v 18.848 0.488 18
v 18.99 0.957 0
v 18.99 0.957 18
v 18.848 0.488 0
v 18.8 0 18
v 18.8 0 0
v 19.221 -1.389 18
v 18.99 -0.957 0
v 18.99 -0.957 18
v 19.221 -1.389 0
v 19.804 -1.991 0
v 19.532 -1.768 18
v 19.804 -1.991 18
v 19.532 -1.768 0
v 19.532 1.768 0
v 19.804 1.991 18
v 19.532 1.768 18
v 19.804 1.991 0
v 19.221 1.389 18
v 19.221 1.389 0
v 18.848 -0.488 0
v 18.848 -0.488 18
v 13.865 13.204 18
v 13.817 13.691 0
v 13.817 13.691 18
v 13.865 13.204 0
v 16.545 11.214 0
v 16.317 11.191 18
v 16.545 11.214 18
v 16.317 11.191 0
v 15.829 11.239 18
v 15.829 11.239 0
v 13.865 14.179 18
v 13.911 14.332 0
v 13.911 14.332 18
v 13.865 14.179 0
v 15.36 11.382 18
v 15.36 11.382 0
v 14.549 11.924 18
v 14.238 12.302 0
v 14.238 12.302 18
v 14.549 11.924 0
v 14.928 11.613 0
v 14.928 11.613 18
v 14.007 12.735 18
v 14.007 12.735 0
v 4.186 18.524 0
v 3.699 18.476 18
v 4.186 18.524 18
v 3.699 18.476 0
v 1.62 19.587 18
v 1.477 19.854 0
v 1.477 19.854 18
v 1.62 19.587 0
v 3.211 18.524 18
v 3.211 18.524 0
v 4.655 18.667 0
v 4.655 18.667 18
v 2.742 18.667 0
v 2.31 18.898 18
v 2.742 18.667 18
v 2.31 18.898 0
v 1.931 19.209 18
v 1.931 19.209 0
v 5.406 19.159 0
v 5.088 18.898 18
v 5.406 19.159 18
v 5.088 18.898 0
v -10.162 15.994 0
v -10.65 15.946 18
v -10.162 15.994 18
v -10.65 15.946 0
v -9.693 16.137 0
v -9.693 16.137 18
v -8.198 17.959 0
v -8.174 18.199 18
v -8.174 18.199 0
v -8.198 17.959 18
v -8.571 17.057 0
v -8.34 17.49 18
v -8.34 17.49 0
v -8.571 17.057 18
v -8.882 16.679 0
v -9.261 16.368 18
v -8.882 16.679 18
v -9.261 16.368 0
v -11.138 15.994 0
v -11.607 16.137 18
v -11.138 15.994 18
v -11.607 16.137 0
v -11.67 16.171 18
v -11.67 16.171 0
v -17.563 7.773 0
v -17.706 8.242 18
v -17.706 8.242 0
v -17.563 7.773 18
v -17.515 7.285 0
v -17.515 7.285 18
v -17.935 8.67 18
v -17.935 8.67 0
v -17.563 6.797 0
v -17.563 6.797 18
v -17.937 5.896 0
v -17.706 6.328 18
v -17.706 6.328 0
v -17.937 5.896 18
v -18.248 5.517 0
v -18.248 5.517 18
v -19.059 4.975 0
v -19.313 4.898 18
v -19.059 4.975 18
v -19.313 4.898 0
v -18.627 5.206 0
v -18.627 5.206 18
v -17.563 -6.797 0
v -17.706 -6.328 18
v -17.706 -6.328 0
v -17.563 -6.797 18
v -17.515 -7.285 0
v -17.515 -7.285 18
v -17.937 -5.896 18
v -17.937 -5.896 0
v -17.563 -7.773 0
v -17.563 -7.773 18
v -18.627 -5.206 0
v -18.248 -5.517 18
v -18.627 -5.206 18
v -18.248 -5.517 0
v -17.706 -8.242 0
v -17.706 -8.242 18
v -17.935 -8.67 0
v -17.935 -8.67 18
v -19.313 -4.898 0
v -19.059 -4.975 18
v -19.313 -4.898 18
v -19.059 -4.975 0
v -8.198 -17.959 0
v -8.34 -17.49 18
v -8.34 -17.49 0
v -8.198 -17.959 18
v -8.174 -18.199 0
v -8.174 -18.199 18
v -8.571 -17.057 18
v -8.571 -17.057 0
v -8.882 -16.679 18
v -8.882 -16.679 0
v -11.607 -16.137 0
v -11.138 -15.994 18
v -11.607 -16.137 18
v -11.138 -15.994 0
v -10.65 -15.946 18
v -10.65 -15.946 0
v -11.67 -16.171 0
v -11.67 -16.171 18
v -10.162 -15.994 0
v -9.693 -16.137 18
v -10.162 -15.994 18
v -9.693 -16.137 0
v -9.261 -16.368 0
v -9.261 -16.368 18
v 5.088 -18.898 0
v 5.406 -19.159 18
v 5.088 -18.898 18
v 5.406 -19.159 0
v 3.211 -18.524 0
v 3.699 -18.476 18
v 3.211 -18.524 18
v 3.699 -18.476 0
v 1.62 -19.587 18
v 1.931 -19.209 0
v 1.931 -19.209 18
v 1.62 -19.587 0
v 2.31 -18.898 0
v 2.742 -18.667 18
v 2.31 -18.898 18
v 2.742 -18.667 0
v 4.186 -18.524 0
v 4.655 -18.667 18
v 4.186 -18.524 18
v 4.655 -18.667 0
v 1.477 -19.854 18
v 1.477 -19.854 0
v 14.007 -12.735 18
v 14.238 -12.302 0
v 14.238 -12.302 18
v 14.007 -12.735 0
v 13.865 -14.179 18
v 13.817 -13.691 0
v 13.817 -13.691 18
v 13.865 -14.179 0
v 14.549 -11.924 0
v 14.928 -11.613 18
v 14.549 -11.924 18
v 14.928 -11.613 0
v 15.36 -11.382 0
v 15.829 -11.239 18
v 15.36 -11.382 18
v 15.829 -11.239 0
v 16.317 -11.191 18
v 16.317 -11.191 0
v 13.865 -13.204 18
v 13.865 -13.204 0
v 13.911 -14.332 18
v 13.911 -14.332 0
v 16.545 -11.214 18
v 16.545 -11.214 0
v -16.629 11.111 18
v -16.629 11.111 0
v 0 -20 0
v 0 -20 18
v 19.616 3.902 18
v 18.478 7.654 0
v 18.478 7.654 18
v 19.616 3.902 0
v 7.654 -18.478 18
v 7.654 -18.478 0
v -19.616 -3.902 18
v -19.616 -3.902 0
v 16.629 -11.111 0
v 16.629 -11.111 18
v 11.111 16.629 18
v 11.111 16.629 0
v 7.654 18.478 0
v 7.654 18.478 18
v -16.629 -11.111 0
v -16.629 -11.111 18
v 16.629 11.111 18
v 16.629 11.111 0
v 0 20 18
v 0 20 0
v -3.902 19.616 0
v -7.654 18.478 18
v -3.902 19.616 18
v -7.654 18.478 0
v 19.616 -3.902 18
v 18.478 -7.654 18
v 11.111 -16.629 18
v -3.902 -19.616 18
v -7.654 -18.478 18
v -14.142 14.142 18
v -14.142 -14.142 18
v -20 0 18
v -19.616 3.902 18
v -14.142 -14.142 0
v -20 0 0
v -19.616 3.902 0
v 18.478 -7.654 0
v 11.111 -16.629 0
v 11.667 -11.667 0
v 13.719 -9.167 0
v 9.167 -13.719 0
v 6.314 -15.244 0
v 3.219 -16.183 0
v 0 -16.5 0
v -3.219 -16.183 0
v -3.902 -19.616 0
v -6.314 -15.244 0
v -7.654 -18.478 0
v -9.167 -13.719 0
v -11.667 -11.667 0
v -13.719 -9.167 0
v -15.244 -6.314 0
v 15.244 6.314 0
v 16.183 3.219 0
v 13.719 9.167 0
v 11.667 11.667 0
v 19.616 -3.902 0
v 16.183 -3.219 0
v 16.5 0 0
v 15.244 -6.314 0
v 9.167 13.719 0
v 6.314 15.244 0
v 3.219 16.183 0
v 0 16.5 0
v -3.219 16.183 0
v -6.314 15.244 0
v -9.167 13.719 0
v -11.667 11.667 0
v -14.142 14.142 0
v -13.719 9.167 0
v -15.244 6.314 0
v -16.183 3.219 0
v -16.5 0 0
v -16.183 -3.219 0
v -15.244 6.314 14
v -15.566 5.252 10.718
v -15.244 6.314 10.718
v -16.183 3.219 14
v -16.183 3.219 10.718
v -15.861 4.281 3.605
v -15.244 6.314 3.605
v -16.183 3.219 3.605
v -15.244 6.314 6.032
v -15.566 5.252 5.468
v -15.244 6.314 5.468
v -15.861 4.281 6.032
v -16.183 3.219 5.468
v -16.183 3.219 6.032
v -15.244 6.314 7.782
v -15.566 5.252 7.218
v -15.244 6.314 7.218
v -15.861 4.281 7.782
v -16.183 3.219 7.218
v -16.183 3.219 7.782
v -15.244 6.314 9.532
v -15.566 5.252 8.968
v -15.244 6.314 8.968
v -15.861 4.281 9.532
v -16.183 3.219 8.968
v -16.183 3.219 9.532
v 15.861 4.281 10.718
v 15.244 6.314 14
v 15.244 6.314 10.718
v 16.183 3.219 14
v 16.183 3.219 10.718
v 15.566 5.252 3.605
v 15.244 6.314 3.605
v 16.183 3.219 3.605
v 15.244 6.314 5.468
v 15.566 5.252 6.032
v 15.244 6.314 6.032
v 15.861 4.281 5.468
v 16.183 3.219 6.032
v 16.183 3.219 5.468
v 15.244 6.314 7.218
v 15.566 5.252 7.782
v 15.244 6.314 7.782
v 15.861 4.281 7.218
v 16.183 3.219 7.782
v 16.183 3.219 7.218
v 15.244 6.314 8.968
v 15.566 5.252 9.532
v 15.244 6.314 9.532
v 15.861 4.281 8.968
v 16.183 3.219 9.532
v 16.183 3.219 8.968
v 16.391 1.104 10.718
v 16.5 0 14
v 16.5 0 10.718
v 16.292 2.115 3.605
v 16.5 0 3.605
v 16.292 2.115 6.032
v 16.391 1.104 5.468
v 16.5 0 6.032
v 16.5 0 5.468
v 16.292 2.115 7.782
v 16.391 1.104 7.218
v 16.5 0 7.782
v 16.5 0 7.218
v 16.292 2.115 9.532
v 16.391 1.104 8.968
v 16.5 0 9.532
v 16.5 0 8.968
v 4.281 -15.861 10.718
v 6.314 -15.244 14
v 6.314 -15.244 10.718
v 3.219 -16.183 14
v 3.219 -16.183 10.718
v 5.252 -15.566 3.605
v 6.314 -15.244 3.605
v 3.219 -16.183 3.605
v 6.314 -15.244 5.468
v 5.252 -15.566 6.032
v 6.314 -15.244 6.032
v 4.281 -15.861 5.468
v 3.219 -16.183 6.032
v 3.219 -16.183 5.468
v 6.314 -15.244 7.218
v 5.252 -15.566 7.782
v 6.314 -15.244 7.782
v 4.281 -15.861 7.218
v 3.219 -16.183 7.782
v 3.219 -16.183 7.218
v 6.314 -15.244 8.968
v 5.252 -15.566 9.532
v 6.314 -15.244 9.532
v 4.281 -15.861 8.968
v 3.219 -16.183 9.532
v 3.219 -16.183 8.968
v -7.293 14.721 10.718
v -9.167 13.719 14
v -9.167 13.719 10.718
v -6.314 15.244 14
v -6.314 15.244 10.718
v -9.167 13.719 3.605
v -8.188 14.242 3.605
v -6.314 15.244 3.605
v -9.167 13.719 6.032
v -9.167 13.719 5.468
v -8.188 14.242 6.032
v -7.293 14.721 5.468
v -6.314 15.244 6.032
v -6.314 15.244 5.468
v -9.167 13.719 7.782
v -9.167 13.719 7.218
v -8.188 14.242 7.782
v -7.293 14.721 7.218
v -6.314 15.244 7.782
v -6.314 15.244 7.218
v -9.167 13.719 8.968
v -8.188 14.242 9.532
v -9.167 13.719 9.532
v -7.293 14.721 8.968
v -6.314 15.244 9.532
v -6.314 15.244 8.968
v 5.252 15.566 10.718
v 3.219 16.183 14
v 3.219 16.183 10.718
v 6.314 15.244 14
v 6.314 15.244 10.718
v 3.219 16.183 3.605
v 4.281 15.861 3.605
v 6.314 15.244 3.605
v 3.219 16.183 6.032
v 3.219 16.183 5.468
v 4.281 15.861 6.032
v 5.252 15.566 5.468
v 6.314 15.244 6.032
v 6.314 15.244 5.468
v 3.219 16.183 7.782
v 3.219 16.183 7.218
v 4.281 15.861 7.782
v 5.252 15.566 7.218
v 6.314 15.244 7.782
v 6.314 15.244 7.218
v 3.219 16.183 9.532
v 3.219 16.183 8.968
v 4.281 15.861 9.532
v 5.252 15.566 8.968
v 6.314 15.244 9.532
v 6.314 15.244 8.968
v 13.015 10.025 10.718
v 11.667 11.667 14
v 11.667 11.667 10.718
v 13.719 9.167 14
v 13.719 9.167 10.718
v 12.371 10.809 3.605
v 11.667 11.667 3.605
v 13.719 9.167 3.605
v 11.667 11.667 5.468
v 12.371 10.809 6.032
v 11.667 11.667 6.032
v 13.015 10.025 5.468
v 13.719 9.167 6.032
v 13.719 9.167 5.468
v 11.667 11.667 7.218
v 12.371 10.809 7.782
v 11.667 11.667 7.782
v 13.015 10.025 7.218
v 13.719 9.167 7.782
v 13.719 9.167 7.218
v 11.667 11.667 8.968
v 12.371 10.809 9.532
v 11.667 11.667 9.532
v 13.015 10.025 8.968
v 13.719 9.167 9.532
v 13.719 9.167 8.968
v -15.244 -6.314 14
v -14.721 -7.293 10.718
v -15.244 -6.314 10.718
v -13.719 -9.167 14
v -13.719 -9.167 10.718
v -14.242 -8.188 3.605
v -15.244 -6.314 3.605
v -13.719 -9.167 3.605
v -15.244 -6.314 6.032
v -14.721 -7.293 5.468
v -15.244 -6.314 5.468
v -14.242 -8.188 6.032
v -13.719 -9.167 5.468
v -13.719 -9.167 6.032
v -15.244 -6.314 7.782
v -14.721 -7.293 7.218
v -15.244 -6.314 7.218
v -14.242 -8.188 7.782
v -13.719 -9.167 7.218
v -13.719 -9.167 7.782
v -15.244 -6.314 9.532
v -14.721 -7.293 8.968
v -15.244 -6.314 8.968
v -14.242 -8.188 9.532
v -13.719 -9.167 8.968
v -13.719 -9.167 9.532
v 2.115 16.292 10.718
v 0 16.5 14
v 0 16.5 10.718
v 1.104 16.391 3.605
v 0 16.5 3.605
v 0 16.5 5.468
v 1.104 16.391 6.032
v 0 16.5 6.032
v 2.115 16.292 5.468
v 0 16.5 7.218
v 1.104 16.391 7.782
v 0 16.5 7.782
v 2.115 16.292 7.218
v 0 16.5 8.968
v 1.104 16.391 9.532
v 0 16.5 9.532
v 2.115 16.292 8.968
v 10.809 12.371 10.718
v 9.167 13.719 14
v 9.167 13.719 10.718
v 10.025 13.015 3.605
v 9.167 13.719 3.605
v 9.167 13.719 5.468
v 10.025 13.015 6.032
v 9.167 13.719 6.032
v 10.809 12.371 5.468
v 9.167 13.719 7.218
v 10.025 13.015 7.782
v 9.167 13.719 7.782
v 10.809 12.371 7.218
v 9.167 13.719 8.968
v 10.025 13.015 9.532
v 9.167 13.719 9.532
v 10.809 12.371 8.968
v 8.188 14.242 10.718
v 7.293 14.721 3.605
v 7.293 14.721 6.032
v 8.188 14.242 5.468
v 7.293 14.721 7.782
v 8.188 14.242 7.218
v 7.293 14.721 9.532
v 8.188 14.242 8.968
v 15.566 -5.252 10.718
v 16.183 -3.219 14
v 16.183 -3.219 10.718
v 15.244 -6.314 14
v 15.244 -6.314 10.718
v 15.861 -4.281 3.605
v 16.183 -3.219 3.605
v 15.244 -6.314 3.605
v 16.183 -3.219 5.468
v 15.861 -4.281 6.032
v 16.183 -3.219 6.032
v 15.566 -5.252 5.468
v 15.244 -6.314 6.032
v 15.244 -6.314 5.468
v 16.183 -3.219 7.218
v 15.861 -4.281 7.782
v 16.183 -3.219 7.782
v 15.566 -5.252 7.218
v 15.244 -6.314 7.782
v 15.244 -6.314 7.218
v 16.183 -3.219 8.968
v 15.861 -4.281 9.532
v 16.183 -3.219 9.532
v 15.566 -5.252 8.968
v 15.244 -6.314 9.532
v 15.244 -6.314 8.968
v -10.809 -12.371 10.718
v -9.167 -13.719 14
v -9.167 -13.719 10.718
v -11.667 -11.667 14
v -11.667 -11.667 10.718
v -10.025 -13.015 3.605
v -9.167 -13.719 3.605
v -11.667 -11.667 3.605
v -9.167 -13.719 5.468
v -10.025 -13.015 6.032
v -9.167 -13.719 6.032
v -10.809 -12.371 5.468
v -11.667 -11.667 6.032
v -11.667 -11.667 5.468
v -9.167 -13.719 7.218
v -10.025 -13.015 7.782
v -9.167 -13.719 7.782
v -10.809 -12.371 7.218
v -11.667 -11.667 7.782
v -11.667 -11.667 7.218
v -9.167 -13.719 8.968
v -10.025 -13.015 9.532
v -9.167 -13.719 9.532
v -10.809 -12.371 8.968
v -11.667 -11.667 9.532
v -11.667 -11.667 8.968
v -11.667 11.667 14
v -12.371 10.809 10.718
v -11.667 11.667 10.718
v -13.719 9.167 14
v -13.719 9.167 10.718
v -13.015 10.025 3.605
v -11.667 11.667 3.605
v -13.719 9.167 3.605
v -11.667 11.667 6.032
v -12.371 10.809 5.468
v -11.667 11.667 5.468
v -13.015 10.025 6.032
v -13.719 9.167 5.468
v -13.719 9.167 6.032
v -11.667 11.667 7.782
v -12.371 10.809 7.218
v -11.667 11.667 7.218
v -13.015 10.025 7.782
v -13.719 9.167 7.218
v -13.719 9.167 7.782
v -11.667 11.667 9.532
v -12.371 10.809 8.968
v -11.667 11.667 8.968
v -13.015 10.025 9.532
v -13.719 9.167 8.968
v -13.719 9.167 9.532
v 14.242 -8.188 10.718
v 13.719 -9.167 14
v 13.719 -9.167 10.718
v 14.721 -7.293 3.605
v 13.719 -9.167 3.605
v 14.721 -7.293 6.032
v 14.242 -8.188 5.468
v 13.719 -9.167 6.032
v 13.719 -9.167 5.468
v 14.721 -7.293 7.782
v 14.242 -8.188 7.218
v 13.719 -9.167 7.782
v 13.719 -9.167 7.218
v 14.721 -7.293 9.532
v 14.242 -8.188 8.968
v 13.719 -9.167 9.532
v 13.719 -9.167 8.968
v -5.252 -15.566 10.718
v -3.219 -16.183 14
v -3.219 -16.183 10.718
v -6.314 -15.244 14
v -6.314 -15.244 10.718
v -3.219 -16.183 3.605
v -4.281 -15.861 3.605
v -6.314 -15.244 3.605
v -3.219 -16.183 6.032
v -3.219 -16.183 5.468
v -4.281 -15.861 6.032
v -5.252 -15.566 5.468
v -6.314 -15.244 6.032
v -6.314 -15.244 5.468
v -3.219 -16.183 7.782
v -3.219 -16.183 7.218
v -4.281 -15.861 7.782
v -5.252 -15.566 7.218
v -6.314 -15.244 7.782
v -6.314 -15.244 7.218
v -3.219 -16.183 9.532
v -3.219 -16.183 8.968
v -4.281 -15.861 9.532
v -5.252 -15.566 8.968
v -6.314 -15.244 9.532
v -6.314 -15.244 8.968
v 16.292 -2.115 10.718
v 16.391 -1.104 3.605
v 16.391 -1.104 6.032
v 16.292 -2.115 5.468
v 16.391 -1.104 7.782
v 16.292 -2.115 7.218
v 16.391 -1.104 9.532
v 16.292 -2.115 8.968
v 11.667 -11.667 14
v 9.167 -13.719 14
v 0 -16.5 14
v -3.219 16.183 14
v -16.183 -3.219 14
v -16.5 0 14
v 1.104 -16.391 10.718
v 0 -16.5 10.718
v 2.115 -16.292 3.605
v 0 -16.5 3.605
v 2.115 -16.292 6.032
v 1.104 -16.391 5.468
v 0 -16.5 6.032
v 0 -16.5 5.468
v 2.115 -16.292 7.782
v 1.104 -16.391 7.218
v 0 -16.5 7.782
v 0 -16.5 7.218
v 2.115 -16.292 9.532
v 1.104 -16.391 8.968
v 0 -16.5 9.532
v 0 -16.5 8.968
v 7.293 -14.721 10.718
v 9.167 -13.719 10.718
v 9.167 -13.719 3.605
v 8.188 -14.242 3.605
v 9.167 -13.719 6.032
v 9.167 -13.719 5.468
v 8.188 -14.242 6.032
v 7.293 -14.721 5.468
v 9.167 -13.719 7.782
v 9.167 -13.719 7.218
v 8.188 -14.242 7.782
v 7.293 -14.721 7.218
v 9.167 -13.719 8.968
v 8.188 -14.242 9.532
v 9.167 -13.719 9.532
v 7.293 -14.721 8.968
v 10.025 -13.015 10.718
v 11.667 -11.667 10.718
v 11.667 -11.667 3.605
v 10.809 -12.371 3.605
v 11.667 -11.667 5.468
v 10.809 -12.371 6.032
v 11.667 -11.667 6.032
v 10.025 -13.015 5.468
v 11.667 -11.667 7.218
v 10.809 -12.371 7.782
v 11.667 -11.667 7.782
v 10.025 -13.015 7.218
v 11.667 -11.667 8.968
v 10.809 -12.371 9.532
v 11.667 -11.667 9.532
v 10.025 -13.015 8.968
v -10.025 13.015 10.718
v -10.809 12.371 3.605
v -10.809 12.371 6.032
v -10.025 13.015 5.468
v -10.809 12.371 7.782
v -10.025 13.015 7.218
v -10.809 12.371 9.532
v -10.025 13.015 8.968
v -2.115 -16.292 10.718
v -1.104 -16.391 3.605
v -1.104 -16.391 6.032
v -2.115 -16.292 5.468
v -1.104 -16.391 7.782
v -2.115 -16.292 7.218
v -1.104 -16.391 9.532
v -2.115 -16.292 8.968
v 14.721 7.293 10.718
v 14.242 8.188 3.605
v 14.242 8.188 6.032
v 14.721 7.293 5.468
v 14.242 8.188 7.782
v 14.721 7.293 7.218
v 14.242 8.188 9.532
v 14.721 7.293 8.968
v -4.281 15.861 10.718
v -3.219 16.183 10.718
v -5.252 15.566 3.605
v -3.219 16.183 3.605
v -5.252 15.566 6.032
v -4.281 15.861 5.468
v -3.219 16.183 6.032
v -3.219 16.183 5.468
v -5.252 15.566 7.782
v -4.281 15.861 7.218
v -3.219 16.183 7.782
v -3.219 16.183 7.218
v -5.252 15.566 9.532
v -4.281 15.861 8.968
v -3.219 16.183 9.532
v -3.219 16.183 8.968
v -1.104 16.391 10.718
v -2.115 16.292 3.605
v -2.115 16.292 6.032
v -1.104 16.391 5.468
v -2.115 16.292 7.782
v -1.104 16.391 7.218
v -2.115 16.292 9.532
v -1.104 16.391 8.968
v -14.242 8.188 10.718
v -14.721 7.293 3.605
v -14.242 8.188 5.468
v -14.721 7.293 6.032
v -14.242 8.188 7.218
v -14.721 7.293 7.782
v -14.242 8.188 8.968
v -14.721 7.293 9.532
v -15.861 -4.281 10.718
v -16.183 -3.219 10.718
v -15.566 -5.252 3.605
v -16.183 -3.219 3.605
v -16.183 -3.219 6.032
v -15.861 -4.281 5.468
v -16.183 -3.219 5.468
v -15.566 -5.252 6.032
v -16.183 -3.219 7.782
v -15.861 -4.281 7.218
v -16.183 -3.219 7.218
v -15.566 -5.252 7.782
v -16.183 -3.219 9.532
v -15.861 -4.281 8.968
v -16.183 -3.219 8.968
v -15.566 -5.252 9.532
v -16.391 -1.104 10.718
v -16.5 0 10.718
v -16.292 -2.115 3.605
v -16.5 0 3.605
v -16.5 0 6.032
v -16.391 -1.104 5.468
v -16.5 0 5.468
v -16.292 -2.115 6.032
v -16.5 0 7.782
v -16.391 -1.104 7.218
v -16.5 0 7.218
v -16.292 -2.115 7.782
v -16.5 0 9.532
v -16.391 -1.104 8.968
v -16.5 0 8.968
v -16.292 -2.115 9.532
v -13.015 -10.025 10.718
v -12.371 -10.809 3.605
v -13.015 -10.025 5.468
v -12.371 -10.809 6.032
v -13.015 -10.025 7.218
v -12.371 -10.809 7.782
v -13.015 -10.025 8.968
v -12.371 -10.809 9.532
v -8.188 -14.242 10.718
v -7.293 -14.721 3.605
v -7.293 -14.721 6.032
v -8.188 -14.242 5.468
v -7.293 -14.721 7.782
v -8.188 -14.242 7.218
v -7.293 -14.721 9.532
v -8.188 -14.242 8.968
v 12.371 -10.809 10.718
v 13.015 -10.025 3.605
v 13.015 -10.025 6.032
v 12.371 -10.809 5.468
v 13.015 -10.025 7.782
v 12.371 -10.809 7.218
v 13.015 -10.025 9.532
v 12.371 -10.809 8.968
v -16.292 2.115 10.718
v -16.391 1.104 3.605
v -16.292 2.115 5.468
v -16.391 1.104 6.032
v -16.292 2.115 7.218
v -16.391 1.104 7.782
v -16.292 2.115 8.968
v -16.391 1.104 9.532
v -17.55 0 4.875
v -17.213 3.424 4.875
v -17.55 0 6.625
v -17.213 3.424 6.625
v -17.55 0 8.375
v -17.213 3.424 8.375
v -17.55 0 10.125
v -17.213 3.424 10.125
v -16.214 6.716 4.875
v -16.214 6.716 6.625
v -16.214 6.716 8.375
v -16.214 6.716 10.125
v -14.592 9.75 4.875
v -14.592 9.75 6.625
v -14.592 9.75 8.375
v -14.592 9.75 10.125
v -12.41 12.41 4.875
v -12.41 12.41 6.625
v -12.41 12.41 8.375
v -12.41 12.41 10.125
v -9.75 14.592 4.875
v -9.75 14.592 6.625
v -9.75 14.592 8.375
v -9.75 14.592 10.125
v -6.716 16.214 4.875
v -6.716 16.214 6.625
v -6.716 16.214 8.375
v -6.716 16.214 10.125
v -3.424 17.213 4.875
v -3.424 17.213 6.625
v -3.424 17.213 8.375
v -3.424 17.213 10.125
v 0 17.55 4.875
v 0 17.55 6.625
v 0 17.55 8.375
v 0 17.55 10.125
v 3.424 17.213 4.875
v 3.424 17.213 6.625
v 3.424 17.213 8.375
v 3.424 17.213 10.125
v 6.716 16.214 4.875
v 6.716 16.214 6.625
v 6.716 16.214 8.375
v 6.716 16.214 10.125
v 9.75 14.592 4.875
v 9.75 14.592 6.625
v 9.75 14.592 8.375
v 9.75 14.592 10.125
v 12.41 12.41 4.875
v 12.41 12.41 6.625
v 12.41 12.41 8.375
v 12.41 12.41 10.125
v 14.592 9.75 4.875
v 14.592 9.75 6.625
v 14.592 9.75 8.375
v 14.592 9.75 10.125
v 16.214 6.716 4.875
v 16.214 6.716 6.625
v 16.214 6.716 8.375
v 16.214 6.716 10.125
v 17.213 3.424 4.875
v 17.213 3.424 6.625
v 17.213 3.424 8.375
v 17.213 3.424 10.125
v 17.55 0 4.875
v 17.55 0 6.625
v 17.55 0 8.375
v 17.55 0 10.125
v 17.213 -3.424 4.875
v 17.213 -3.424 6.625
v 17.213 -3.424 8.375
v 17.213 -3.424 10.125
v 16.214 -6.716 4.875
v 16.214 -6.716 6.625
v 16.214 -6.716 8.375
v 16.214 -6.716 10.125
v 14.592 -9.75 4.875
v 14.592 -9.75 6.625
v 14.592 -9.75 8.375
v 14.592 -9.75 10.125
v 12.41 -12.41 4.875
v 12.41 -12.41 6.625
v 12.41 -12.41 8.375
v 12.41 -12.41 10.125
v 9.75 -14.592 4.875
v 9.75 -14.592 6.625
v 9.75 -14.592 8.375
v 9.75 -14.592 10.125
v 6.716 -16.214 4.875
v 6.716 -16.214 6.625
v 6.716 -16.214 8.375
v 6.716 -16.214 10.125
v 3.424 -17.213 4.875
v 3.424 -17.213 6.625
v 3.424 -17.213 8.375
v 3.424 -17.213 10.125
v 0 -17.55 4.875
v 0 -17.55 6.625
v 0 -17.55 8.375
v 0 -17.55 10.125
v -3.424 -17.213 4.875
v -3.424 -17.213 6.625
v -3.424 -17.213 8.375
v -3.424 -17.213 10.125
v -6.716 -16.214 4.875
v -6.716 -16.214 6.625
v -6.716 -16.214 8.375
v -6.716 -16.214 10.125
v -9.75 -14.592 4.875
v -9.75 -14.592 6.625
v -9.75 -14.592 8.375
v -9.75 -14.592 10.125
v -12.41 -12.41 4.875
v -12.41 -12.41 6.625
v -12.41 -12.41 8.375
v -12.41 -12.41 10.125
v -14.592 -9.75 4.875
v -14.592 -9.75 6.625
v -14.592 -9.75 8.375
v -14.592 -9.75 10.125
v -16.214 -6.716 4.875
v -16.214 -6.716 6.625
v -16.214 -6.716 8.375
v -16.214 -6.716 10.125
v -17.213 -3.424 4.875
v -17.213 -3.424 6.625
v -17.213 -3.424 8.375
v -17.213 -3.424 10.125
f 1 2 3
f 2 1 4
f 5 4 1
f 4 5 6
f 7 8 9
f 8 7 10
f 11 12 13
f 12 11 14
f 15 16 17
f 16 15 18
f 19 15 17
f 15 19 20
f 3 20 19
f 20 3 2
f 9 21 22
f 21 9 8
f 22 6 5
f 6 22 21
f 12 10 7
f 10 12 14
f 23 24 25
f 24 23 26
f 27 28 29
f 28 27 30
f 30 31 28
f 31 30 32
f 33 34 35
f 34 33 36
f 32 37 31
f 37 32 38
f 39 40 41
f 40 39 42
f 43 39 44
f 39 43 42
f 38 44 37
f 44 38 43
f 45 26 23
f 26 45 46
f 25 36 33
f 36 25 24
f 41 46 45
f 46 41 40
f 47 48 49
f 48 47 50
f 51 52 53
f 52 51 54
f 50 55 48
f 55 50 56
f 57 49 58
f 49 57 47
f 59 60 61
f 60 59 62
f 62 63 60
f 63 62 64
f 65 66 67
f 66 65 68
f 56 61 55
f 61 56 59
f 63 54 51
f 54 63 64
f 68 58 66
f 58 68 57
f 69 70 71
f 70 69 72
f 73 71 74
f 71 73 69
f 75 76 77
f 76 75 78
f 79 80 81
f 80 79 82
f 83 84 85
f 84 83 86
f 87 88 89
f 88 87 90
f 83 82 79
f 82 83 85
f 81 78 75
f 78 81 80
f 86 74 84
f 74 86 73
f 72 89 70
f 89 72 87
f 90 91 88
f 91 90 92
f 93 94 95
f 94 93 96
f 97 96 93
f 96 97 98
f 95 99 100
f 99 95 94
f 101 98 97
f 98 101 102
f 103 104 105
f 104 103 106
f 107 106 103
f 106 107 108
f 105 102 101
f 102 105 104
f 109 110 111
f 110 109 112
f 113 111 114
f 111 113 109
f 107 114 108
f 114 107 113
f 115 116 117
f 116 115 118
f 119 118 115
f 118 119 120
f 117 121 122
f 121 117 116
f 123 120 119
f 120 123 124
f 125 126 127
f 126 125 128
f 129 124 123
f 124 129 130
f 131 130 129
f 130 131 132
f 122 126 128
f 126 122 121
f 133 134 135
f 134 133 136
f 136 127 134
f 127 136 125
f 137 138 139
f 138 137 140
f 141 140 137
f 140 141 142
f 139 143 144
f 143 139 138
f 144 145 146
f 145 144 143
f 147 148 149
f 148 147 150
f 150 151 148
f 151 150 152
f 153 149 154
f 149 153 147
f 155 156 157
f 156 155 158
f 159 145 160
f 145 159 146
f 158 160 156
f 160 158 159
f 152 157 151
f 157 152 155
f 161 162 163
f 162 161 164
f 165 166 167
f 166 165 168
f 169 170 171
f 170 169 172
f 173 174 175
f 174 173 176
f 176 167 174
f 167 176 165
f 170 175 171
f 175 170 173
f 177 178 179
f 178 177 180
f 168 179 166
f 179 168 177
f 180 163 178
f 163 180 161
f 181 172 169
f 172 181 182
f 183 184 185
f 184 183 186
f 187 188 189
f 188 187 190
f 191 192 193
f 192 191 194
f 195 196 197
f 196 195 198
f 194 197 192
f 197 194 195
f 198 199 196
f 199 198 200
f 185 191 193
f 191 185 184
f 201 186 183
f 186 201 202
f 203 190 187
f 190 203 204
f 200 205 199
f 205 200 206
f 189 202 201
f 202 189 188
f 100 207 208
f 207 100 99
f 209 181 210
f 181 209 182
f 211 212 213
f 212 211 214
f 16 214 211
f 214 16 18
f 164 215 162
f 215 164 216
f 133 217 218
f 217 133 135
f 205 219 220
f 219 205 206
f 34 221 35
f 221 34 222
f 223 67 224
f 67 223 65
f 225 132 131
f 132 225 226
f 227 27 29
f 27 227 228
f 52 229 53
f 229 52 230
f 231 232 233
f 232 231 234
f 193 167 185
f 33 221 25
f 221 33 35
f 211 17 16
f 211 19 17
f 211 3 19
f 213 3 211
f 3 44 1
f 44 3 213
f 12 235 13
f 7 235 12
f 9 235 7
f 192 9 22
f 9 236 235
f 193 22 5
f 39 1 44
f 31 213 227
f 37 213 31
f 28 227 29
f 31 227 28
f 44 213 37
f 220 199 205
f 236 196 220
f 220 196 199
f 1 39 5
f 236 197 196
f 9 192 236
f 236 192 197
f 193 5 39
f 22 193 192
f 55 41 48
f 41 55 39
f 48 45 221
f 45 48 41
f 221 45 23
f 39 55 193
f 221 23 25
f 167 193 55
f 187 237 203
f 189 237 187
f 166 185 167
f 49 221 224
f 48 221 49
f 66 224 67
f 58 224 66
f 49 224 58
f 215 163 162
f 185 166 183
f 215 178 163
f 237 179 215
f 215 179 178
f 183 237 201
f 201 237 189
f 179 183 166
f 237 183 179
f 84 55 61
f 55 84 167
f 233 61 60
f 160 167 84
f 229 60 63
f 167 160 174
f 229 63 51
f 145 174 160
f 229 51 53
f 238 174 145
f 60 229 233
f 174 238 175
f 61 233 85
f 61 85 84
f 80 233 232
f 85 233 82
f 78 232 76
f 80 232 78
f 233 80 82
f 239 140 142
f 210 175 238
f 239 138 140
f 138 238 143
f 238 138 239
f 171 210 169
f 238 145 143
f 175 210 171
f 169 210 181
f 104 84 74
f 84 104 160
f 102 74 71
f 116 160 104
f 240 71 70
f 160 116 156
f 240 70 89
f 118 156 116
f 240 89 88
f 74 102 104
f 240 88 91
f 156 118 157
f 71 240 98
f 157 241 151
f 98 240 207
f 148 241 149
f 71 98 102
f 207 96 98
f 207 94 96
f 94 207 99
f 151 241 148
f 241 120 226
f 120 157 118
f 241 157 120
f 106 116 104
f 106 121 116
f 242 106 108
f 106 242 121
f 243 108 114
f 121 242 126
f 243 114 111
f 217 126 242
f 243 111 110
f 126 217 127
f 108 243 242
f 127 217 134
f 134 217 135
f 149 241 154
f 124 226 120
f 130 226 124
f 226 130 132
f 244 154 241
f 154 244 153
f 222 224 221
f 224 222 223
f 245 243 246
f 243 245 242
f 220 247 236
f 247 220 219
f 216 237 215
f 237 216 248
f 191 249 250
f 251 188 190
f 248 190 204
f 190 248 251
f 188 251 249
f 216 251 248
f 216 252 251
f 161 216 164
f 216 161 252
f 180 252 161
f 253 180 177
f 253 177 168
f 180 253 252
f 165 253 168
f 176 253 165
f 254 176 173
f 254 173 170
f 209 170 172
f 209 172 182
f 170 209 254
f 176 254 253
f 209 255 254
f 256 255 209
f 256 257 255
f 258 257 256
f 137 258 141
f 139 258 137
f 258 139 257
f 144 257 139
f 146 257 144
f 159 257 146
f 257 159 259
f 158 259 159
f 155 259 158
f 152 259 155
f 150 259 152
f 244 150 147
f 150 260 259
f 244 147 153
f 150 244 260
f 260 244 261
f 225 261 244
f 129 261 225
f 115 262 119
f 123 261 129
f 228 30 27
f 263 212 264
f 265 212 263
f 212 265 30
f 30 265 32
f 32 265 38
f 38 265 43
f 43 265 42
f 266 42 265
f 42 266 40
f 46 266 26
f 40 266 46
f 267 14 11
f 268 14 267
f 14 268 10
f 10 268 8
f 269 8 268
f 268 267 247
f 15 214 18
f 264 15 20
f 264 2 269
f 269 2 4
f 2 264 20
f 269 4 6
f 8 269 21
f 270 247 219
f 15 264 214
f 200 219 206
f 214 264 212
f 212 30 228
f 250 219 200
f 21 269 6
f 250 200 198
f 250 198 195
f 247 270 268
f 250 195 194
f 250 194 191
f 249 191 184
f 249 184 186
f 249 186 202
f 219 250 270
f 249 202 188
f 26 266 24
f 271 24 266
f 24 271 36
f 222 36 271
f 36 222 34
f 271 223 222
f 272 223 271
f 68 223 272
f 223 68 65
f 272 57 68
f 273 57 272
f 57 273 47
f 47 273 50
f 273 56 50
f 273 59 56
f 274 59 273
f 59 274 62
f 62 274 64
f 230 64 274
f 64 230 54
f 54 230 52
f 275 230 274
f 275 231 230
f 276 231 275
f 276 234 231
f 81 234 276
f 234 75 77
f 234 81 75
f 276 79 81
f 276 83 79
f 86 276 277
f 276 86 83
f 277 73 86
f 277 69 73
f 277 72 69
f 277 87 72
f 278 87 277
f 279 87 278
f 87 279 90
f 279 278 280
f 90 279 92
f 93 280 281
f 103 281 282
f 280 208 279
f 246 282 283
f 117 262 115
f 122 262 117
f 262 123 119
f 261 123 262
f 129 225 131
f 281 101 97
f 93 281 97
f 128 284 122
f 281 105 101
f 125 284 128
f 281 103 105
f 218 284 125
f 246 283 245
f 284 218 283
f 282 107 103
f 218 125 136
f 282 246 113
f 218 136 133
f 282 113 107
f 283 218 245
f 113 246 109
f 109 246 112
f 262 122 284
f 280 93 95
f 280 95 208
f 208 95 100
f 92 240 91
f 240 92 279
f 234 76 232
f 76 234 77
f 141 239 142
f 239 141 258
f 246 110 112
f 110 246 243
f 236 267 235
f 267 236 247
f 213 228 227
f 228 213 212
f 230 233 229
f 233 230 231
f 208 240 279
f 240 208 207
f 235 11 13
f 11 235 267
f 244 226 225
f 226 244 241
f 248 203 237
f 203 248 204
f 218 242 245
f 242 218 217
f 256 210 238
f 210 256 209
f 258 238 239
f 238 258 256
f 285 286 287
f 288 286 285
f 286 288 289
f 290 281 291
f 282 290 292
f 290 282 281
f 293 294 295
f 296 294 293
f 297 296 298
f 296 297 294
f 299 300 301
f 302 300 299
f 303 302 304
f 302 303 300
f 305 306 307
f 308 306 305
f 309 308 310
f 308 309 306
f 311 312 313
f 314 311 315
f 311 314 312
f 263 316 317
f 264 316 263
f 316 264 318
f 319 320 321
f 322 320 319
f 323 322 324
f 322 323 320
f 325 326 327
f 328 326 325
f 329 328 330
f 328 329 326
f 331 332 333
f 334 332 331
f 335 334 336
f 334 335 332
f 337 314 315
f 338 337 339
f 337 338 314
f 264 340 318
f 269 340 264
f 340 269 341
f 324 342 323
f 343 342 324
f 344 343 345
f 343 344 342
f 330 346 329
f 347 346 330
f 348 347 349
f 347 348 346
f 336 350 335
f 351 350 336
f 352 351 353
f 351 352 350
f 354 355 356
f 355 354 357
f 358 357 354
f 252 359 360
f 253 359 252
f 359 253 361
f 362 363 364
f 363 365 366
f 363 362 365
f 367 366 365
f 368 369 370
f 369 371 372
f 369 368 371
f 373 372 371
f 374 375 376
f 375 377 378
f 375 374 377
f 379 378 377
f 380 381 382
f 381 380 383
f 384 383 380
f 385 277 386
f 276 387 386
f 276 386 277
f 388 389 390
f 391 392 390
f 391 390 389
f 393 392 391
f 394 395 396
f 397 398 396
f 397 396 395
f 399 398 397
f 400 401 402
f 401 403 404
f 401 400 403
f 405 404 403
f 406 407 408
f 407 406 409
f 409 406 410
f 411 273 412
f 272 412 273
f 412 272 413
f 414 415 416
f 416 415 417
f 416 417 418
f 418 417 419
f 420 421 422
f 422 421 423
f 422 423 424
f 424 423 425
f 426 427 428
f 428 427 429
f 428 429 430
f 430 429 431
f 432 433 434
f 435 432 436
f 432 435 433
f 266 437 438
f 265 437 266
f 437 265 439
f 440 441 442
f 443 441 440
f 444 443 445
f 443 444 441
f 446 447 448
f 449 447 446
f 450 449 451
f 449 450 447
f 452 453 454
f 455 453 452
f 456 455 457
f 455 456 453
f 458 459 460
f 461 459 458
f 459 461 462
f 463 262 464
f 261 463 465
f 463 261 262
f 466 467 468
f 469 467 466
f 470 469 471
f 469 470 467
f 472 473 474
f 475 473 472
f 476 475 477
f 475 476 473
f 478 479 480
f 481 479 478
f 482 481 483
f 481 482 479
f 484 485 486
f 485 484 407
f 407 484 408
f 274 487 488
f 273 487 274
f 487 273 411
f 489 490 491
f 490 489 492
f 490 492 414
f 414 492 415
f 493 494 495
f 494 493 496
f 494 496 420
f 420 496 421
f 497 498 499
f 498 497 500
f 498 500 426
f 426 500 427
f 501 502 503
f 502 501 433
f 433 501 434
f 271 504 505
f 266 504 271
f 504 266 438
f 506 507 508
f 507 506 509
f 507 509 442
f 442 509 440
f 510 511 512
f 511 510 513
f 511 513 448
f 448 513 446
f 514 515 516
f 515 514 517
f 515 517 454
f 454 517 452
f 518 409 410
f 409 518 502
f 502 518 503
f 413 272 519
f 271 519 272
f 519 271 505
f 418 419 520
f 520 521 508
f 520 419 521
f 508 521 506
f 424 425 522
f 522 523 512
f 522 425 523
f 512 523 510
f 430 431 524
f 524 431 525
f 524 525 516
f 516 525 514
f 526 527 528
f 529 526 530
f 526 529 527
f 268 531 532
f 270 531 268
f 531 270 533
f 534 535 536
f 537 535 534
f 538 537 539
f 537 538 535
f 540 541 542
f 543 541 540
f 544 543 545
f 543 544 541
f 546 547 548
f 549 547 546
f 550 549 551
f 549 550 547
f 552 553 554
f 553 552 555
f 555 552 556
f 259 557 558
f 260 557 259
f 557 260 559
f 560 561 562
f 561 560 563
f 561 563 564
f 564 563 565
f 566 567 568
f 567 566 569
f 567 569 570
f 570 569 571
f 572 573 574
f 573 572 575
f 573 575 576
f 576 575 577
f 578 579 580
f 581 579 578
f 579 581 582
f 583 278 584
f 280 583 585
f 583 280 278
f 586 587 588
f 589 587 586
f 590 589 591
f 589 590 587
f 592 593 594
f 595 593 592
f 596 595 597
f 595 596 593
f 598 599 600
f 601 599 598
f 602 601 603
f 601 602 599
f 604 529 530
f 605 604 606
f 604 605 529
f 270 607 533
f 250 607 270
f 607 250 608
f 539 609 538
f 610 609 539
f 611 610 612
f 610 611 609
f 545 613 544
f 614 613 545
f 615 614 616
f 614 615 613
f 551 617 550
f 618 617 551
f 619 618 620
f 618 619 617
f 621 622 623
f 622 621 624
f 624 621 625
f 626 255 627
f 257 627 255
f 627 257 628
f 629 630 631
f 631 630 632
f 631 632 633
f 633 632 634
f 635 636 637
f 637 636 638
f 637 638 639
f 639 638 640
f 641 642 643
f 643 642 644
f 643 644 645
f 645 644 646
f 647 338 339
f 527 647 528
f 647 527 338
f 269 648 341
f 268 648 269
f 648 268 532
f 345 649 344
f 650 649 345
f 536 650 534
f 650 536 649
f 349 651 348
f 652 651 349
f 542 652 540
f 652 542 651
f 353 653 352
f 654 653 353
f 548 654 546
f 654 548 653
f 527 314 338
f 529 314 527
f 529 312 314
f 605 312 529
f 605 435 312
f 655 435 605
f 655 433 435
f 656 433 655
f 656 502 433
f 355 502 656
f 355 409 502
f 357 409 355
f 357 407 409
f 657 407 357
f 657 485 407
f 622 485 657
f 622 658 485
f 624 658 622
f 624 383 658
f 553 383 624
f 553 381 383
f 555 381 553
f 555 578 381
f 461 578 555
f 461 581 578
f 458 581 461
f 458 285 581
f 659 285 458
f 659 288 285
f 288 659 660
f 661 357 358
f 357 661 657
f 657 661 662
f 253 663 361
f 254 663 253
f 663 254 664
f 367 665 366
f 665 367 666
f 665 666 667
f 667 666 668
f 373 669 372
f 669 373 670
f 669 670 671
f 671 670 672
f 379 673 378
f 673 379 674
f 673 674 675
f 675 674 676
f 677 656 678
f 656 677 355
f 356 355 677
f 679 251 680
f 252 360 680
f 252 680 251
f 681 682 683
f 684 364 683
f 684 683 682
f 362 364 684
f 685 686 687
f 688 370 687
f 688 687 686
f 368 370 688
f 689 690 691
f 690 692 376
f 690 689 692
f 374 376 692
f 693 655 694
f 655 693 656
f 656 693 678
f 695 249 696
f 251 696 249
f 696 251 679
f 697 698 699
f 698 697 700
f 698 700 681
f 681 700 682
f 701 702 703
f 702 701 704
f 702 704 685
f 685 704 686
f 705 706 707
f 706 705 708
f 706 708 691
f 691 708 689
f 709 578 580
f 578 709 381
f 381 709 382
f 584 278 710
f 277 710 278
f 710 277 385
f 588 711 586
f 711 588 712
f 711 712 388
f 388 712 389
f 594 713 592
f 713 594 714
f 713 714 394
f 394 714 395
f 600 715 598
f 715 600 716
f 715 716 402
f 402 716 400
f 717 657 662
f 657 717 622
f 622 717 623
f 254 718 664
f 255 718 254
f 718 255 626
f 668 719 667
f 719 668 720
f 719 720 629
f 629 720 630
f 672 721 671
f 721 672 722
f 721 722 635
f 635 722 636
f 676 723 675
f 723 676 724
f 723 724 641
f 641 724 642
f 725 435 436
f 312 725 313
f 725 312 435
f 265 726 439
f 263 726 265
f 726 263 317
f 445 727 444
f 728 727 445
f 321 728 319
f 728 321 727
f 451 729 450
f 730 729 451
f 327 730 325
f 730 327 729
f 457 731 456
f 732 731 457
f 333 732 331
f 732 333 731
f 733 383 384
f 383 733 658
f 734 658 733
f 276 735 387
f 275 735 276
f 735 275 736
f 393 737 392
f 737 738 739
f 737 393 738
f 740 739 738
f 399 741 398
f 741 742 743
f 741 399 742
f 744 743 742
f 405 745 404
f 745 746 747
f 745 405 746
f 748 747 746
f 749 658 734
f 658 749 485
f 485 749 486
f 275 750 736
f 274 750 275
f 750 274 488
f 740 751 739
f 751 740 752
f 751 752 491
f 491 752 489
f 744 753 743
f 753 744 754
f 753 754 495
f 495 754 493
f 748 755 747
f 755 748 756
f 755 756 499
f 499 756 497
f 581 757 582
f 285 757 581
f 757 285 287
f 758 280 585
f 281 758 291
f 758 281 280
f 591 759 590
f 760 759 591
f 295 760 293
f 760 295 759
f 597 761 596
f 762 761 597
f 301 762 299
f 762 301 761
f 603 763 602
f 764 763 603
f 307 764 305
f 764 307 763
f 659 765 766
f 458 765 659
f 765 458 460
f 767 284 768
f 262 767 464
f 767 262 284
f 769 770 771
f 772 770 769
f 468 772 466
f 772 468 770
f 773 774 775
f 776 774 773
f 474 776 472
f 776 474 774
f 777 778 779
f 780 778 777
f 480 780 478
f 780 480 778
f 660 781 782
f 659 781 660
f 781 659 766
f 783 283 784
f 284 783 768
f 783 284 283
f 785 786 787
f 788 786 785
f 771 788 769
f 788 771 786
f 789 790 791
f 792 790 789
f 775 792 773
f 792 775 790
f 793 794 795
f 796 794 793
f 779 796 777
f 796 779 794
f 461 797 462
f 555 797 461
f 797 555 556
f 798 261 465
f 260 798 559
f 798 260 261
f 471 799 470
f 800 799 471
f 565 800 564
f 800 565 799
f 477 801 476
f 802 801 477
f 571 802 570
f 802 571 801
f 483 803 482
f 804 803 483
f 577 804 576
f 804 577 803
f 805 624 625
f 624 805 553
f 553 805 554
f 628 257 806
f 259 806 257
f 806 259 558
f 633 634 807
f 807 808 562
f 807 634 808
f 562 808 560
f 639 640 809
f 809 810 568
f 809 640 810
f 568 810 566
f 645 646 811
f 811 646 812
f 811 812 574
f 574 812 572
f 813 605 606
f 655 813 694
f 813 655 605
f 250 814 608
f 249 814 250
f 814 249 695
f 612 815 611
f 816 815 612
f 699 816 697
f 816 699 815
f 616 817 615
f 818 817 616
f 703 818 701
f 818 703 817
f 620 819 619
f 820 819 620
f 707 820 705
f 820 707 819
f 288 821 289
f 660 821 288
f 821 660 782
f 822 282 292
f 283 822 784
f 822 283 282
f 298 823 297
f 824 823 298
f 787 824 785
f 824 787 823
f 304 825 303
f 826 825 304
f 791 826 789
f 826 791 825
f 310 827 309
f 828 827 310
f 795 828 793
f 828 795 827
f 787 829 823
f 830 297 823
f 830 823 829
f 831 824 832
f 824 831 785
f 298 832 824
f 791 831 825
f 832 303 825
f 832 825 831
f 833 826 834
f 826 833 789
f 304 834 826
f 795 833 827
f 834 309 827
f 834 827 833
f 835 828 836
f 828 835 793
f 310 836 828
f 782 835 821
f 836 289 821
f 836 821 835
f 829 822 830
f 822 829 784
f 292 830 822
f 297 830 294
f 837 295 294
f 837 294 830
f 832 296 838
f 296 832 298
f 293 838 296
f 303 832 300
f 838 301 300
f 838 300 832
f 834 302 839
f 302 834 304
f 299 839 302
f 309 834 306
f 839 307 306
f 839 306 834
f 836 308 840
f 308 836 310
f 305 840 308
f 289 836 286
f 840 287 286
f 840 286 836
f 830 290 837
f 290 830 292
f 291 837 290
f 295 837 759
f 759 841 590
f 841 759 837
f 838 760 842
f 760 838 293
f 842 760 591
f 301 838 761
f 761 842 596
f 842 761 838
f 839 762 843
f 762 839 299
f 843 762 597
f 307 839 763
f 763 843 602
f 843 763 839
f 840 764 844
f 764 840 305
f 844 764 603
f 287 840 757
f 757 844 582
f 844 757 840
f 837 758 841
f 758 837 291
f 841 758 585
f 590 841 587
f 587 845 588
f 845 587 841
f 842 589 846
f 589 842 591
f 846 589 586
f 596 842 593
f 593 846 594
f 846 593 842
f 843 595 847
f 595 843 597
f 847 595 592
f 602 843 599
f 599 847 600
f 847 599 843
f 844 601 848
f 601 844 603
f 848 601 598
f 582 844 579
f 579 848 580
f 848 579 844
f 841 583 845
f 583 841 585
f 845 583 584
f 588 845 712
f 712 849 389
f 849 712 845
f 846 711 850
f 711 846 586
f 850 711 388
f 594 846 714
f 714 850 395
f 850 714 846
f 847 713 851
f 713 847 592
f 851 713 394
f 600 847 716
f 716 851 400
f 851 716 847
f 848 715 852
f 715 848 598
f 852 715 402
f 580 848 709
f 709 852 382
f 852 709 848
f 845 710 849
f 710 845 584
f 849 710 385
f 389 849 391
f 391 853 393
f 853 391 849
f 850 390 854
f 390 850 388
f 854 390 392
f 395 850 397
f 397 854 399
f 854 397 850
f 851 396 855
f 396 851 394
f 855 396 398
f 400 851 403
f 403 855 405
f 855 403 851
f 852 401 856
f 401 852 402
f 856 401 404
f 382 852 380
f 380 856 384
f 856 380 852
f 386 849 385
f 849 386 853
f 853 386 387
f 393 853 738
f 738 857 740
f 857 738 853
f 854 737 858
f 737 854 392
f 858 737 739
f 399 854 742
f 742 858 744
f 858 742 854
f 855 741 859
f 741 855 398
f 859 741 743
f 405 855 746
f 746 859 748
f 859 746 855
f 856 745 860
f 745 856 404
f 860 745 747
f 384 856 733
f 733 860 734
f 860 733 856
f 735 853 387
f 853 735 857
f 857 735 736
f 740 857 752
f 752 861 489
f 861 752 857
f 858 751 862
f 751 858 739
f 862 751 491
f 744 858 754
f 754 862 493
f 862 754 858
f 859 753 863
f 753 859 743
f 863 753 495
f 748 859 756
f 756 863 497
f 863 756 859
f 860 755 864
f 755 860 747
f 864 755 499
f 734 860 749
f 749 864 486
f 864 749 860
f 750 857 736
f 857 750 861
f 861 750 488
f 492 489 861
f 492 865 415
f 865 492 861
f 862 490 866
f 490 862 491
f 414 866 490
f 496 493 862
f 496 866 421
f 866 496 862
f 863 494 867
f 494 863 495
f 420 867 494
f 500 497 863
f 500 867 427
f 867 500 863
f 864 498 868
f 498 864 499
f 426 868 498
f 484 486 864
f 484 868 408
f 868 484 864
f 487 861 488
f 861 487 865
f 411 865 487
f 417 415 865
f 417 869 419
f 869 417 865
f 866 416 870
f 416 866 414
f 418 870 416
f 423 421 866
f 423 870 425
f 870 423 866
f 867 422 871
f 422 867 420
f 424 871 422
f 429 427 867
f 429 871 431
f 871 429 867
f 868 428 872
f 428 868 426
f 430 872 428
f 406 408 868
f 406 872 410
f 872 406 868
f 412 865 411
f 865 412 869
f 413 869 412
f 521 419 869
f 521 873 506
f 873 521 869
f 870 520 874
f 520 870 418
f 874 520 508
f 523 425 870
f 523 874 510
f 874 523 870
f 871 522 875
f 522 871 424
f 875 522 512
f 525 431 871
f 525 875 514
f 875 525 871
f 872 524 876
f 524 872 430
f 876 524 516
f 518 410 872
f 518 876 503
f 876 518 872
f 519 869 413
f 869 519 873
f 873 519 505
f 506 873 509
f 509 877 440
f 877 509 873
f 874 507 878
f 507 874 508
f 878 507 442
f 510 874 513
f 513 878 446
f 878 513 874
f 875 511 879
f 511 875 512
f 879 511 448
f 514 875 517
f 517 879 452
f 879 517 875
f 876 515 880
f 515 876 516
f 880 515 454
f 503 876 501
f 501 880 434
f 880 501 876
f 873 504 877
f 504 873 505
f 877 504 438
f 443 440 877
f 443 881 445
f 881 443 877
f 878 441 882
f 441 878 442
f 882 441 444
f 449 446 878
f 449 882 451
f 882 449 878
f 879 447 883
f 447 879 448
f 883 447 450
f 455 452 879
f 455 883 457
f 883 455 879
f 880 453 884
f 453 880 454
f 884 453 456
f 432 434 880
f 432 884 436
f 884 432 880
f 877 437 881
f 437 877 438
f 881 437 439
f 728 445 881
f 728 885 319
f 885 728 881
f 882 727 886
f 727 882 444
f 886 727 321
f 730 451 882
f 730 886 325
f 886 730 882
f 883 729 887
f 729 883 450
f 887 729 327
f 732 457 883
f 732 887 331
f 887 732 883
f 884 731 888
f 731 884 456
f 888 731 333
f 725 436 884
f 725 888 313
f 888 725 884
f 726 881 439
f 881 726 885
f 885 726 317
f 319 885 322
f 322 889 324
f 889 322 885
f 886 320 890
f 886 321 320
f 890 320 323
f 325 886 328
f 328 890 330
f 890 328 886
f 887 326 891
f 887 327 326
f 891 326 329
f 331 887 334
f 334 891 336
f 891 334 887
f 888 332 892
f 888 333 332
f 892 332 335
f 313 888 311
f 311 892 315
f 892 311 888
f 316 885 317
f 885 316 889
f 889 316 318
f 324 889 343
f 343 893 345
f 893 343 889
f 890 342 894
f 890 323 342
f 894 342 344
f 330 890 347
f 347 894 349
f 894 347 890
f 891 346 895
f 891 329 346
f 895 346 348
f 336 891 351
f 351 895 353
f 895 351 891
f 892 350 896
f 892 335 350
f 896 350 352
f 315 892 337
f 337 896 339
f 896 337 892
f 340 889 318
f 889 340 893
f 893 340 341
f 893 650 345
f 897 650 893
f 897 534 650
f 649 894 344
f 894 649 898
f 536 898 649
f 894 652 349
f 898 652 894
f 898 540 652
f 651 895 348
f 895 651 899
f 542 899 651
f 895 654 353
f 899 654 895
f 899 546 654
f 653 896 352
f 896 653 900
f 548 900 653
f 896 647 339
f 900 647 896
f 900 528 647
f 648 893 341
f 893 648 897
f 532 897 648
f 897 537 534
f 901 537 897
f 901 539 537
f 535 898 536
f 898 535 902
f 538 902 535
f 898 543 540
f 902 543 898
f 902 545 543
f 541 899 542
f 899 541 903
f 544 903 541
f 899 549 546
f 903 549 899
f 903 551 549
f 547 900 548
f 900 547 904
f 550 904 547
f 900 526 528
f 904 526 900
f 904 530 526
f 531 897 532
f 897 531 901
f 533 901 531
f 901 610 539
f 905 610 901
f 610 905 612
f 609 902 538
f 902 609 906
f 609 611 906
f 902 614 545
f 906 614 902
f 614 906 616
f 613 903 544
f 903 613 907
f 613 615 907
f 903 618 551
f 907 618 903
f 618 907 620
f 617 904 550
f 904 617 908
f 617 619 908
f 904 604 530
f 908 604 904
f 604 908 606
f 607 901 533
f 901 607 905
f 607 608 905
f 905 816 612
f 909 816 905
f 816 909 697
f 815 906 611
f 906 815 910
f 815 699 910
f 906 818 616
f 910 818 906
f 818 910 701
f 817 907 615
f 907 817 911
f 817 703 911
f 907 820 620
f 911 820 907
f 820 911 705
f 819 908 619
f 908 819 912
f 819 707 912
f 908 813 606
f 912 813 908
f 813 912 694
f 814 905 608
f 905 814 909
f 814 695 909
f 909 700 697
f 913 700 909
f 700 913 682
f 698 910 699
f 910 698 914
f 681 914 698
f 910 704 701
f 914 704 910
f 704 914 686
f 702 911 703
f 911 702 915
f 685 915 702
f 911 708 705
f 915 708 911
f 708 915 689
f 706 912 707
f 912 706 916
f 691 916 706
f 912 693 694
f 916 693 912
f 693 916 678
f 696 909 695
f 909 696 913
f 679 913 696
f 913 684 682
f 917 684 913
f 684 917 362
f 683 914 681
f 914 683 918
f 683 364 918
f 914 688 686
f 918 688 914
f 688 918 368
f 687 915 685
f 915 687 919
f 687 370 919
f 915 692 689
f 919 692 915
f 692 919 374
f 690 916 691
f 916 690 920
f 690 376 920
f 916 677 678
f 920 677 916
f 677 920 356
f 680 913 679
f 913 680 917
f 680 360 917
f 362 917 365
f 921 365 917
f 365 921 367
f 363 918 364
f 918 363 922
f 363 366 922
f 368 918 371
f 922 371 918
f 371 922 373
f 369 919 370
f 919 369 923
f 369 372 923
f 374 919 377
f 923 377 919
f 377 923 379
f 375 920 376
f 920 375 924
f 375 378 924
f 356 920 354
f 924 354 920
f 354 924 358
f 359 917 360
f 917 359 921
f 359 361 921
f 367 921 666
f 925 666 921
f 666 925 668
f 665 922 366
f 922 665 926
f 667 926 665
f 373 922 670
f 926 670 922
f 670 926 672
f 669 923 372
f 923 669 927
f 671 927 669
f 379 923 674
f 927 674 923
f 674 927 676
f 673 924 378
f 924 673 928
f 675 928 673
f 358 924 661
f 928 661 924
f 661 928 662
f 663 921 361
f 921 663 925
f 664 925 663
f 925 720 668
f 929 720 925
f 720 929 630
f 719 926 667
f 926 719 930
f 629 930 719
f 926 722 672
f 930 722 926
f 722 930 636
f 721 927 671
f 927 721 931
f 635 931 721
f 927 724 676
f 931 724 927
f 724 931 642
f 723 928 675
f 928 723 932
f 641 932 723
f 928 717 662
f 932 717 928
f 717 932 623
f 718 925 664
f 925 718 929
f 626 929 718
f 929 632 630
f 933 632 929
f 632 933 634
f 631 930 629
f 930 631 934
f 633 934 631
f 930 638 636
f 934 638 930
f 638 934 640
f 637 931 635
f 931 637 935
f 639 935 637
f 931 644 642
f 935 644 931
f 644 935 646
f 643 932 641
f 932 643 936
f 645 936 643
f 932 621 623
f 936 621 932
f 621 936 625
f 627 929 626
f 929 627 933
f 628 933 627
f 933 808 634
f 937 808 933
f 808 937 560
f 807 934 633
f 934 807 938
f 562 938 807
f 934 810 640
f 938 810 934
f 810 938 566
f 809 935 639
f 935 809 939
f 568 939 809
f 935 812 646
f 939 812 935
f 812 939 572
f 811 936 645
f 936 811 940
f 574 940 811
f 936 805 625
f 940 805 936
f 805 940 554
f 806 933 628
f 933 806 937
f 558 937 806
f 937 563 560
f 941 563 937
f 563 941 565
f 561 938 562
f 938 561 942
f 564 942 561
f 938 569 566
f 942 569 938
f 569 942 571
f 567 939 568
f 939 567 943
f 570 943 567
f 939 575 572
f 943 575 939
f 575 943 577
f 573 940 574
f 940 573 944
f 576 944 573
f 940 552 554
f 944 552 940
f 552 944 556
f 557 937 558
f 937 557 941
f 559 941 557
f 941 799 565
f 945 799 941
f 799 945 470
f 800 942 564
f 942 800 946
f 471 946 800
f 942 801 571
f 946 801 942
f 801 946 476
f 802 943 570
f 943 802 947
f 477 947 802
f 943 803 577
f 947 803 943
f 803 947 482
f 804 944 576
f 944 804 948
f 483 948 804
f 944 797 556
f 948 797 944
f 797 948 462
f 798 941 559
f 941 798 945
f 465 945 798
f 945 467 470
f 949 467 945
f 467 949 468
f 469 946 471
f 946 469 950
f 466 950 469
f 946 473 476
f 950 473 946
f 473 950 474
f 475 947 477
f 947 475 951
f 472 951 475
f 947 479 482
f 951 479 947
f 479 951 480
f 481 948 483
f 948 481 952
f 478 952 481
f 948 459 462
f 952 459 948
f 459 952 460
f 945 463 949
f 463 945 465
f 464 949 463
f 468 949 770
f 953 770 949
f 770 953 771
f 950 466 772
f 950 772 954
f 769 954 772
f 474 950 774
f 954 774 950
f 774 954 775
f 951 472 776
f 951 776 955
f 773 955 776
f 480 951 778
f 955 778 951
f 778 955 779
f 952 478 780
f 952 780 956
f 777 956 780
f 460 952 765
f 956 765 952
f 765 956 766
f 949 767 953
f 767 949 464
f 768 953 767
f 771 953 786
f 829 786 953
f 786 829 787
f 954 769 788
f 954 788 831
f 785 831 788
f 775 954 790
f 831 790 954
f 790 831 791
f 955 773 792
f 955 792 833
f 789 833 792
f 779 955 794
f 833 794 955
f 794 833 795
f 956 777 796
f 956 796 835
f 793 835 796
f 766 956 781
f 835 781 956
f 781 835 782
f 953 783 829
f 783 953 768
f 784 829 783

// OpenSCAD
$fn = 32;

// ----------------------------------------------------------------------
// Threaded cap: 40 mm body, 18 mm tall, 33 mm threaded bore
// ----------------------------------------------------------------------

// --- parameters (mm) ---
outer_d = 40;             // cap outside diameter
body_h = 18;              // cap height
top_t = 4;                // closed top thickness
bore_d = 33;              // bore core diameter
pitch = 1.75;             // thread pitch
thread_d = 1.05;          // thread depth
thread_z = 3;             // thread start above the rim
thread_h = 8;             // threaded height
flutes = 9;               // number of knurl flutes
flute_d = 5;              // flute cutter diameter
flute_depth = 1.2;        // flute depth into the rim

difference() {
  union() {
    cylinder(h = 18, d = outer_d);
  }
  /* threaded bore, closed at the top */
  translate([0, 0, -2.5]) cylinder(h = 16.5, d = bore_d);
  translate([0, 0, 3]) rotate_extrude() polygon([[15.5, 0], [15.5, 8], [16, 8], [17.55, 7.125], [16, 6.25], [17.55, 5.375], [16, 4.5], [17.55, 3.625], [16, 2.75], [17.55, 1.875], [16, 0], [15.5, 0]]);
  /* knurl flutes around the rim */
  for (i = [0 : flutes - 1]) {
    a = i * 360 / flutes;
    translate([(outer_d / 2 + flute_d / 2 - flute_depth) * cos(a), (outer_d / 2 + flute_d / 2 - flute_depth) * sin(a), -2.5]) cylinder(h = body_h + 5, d = flute_d);
  }
}
